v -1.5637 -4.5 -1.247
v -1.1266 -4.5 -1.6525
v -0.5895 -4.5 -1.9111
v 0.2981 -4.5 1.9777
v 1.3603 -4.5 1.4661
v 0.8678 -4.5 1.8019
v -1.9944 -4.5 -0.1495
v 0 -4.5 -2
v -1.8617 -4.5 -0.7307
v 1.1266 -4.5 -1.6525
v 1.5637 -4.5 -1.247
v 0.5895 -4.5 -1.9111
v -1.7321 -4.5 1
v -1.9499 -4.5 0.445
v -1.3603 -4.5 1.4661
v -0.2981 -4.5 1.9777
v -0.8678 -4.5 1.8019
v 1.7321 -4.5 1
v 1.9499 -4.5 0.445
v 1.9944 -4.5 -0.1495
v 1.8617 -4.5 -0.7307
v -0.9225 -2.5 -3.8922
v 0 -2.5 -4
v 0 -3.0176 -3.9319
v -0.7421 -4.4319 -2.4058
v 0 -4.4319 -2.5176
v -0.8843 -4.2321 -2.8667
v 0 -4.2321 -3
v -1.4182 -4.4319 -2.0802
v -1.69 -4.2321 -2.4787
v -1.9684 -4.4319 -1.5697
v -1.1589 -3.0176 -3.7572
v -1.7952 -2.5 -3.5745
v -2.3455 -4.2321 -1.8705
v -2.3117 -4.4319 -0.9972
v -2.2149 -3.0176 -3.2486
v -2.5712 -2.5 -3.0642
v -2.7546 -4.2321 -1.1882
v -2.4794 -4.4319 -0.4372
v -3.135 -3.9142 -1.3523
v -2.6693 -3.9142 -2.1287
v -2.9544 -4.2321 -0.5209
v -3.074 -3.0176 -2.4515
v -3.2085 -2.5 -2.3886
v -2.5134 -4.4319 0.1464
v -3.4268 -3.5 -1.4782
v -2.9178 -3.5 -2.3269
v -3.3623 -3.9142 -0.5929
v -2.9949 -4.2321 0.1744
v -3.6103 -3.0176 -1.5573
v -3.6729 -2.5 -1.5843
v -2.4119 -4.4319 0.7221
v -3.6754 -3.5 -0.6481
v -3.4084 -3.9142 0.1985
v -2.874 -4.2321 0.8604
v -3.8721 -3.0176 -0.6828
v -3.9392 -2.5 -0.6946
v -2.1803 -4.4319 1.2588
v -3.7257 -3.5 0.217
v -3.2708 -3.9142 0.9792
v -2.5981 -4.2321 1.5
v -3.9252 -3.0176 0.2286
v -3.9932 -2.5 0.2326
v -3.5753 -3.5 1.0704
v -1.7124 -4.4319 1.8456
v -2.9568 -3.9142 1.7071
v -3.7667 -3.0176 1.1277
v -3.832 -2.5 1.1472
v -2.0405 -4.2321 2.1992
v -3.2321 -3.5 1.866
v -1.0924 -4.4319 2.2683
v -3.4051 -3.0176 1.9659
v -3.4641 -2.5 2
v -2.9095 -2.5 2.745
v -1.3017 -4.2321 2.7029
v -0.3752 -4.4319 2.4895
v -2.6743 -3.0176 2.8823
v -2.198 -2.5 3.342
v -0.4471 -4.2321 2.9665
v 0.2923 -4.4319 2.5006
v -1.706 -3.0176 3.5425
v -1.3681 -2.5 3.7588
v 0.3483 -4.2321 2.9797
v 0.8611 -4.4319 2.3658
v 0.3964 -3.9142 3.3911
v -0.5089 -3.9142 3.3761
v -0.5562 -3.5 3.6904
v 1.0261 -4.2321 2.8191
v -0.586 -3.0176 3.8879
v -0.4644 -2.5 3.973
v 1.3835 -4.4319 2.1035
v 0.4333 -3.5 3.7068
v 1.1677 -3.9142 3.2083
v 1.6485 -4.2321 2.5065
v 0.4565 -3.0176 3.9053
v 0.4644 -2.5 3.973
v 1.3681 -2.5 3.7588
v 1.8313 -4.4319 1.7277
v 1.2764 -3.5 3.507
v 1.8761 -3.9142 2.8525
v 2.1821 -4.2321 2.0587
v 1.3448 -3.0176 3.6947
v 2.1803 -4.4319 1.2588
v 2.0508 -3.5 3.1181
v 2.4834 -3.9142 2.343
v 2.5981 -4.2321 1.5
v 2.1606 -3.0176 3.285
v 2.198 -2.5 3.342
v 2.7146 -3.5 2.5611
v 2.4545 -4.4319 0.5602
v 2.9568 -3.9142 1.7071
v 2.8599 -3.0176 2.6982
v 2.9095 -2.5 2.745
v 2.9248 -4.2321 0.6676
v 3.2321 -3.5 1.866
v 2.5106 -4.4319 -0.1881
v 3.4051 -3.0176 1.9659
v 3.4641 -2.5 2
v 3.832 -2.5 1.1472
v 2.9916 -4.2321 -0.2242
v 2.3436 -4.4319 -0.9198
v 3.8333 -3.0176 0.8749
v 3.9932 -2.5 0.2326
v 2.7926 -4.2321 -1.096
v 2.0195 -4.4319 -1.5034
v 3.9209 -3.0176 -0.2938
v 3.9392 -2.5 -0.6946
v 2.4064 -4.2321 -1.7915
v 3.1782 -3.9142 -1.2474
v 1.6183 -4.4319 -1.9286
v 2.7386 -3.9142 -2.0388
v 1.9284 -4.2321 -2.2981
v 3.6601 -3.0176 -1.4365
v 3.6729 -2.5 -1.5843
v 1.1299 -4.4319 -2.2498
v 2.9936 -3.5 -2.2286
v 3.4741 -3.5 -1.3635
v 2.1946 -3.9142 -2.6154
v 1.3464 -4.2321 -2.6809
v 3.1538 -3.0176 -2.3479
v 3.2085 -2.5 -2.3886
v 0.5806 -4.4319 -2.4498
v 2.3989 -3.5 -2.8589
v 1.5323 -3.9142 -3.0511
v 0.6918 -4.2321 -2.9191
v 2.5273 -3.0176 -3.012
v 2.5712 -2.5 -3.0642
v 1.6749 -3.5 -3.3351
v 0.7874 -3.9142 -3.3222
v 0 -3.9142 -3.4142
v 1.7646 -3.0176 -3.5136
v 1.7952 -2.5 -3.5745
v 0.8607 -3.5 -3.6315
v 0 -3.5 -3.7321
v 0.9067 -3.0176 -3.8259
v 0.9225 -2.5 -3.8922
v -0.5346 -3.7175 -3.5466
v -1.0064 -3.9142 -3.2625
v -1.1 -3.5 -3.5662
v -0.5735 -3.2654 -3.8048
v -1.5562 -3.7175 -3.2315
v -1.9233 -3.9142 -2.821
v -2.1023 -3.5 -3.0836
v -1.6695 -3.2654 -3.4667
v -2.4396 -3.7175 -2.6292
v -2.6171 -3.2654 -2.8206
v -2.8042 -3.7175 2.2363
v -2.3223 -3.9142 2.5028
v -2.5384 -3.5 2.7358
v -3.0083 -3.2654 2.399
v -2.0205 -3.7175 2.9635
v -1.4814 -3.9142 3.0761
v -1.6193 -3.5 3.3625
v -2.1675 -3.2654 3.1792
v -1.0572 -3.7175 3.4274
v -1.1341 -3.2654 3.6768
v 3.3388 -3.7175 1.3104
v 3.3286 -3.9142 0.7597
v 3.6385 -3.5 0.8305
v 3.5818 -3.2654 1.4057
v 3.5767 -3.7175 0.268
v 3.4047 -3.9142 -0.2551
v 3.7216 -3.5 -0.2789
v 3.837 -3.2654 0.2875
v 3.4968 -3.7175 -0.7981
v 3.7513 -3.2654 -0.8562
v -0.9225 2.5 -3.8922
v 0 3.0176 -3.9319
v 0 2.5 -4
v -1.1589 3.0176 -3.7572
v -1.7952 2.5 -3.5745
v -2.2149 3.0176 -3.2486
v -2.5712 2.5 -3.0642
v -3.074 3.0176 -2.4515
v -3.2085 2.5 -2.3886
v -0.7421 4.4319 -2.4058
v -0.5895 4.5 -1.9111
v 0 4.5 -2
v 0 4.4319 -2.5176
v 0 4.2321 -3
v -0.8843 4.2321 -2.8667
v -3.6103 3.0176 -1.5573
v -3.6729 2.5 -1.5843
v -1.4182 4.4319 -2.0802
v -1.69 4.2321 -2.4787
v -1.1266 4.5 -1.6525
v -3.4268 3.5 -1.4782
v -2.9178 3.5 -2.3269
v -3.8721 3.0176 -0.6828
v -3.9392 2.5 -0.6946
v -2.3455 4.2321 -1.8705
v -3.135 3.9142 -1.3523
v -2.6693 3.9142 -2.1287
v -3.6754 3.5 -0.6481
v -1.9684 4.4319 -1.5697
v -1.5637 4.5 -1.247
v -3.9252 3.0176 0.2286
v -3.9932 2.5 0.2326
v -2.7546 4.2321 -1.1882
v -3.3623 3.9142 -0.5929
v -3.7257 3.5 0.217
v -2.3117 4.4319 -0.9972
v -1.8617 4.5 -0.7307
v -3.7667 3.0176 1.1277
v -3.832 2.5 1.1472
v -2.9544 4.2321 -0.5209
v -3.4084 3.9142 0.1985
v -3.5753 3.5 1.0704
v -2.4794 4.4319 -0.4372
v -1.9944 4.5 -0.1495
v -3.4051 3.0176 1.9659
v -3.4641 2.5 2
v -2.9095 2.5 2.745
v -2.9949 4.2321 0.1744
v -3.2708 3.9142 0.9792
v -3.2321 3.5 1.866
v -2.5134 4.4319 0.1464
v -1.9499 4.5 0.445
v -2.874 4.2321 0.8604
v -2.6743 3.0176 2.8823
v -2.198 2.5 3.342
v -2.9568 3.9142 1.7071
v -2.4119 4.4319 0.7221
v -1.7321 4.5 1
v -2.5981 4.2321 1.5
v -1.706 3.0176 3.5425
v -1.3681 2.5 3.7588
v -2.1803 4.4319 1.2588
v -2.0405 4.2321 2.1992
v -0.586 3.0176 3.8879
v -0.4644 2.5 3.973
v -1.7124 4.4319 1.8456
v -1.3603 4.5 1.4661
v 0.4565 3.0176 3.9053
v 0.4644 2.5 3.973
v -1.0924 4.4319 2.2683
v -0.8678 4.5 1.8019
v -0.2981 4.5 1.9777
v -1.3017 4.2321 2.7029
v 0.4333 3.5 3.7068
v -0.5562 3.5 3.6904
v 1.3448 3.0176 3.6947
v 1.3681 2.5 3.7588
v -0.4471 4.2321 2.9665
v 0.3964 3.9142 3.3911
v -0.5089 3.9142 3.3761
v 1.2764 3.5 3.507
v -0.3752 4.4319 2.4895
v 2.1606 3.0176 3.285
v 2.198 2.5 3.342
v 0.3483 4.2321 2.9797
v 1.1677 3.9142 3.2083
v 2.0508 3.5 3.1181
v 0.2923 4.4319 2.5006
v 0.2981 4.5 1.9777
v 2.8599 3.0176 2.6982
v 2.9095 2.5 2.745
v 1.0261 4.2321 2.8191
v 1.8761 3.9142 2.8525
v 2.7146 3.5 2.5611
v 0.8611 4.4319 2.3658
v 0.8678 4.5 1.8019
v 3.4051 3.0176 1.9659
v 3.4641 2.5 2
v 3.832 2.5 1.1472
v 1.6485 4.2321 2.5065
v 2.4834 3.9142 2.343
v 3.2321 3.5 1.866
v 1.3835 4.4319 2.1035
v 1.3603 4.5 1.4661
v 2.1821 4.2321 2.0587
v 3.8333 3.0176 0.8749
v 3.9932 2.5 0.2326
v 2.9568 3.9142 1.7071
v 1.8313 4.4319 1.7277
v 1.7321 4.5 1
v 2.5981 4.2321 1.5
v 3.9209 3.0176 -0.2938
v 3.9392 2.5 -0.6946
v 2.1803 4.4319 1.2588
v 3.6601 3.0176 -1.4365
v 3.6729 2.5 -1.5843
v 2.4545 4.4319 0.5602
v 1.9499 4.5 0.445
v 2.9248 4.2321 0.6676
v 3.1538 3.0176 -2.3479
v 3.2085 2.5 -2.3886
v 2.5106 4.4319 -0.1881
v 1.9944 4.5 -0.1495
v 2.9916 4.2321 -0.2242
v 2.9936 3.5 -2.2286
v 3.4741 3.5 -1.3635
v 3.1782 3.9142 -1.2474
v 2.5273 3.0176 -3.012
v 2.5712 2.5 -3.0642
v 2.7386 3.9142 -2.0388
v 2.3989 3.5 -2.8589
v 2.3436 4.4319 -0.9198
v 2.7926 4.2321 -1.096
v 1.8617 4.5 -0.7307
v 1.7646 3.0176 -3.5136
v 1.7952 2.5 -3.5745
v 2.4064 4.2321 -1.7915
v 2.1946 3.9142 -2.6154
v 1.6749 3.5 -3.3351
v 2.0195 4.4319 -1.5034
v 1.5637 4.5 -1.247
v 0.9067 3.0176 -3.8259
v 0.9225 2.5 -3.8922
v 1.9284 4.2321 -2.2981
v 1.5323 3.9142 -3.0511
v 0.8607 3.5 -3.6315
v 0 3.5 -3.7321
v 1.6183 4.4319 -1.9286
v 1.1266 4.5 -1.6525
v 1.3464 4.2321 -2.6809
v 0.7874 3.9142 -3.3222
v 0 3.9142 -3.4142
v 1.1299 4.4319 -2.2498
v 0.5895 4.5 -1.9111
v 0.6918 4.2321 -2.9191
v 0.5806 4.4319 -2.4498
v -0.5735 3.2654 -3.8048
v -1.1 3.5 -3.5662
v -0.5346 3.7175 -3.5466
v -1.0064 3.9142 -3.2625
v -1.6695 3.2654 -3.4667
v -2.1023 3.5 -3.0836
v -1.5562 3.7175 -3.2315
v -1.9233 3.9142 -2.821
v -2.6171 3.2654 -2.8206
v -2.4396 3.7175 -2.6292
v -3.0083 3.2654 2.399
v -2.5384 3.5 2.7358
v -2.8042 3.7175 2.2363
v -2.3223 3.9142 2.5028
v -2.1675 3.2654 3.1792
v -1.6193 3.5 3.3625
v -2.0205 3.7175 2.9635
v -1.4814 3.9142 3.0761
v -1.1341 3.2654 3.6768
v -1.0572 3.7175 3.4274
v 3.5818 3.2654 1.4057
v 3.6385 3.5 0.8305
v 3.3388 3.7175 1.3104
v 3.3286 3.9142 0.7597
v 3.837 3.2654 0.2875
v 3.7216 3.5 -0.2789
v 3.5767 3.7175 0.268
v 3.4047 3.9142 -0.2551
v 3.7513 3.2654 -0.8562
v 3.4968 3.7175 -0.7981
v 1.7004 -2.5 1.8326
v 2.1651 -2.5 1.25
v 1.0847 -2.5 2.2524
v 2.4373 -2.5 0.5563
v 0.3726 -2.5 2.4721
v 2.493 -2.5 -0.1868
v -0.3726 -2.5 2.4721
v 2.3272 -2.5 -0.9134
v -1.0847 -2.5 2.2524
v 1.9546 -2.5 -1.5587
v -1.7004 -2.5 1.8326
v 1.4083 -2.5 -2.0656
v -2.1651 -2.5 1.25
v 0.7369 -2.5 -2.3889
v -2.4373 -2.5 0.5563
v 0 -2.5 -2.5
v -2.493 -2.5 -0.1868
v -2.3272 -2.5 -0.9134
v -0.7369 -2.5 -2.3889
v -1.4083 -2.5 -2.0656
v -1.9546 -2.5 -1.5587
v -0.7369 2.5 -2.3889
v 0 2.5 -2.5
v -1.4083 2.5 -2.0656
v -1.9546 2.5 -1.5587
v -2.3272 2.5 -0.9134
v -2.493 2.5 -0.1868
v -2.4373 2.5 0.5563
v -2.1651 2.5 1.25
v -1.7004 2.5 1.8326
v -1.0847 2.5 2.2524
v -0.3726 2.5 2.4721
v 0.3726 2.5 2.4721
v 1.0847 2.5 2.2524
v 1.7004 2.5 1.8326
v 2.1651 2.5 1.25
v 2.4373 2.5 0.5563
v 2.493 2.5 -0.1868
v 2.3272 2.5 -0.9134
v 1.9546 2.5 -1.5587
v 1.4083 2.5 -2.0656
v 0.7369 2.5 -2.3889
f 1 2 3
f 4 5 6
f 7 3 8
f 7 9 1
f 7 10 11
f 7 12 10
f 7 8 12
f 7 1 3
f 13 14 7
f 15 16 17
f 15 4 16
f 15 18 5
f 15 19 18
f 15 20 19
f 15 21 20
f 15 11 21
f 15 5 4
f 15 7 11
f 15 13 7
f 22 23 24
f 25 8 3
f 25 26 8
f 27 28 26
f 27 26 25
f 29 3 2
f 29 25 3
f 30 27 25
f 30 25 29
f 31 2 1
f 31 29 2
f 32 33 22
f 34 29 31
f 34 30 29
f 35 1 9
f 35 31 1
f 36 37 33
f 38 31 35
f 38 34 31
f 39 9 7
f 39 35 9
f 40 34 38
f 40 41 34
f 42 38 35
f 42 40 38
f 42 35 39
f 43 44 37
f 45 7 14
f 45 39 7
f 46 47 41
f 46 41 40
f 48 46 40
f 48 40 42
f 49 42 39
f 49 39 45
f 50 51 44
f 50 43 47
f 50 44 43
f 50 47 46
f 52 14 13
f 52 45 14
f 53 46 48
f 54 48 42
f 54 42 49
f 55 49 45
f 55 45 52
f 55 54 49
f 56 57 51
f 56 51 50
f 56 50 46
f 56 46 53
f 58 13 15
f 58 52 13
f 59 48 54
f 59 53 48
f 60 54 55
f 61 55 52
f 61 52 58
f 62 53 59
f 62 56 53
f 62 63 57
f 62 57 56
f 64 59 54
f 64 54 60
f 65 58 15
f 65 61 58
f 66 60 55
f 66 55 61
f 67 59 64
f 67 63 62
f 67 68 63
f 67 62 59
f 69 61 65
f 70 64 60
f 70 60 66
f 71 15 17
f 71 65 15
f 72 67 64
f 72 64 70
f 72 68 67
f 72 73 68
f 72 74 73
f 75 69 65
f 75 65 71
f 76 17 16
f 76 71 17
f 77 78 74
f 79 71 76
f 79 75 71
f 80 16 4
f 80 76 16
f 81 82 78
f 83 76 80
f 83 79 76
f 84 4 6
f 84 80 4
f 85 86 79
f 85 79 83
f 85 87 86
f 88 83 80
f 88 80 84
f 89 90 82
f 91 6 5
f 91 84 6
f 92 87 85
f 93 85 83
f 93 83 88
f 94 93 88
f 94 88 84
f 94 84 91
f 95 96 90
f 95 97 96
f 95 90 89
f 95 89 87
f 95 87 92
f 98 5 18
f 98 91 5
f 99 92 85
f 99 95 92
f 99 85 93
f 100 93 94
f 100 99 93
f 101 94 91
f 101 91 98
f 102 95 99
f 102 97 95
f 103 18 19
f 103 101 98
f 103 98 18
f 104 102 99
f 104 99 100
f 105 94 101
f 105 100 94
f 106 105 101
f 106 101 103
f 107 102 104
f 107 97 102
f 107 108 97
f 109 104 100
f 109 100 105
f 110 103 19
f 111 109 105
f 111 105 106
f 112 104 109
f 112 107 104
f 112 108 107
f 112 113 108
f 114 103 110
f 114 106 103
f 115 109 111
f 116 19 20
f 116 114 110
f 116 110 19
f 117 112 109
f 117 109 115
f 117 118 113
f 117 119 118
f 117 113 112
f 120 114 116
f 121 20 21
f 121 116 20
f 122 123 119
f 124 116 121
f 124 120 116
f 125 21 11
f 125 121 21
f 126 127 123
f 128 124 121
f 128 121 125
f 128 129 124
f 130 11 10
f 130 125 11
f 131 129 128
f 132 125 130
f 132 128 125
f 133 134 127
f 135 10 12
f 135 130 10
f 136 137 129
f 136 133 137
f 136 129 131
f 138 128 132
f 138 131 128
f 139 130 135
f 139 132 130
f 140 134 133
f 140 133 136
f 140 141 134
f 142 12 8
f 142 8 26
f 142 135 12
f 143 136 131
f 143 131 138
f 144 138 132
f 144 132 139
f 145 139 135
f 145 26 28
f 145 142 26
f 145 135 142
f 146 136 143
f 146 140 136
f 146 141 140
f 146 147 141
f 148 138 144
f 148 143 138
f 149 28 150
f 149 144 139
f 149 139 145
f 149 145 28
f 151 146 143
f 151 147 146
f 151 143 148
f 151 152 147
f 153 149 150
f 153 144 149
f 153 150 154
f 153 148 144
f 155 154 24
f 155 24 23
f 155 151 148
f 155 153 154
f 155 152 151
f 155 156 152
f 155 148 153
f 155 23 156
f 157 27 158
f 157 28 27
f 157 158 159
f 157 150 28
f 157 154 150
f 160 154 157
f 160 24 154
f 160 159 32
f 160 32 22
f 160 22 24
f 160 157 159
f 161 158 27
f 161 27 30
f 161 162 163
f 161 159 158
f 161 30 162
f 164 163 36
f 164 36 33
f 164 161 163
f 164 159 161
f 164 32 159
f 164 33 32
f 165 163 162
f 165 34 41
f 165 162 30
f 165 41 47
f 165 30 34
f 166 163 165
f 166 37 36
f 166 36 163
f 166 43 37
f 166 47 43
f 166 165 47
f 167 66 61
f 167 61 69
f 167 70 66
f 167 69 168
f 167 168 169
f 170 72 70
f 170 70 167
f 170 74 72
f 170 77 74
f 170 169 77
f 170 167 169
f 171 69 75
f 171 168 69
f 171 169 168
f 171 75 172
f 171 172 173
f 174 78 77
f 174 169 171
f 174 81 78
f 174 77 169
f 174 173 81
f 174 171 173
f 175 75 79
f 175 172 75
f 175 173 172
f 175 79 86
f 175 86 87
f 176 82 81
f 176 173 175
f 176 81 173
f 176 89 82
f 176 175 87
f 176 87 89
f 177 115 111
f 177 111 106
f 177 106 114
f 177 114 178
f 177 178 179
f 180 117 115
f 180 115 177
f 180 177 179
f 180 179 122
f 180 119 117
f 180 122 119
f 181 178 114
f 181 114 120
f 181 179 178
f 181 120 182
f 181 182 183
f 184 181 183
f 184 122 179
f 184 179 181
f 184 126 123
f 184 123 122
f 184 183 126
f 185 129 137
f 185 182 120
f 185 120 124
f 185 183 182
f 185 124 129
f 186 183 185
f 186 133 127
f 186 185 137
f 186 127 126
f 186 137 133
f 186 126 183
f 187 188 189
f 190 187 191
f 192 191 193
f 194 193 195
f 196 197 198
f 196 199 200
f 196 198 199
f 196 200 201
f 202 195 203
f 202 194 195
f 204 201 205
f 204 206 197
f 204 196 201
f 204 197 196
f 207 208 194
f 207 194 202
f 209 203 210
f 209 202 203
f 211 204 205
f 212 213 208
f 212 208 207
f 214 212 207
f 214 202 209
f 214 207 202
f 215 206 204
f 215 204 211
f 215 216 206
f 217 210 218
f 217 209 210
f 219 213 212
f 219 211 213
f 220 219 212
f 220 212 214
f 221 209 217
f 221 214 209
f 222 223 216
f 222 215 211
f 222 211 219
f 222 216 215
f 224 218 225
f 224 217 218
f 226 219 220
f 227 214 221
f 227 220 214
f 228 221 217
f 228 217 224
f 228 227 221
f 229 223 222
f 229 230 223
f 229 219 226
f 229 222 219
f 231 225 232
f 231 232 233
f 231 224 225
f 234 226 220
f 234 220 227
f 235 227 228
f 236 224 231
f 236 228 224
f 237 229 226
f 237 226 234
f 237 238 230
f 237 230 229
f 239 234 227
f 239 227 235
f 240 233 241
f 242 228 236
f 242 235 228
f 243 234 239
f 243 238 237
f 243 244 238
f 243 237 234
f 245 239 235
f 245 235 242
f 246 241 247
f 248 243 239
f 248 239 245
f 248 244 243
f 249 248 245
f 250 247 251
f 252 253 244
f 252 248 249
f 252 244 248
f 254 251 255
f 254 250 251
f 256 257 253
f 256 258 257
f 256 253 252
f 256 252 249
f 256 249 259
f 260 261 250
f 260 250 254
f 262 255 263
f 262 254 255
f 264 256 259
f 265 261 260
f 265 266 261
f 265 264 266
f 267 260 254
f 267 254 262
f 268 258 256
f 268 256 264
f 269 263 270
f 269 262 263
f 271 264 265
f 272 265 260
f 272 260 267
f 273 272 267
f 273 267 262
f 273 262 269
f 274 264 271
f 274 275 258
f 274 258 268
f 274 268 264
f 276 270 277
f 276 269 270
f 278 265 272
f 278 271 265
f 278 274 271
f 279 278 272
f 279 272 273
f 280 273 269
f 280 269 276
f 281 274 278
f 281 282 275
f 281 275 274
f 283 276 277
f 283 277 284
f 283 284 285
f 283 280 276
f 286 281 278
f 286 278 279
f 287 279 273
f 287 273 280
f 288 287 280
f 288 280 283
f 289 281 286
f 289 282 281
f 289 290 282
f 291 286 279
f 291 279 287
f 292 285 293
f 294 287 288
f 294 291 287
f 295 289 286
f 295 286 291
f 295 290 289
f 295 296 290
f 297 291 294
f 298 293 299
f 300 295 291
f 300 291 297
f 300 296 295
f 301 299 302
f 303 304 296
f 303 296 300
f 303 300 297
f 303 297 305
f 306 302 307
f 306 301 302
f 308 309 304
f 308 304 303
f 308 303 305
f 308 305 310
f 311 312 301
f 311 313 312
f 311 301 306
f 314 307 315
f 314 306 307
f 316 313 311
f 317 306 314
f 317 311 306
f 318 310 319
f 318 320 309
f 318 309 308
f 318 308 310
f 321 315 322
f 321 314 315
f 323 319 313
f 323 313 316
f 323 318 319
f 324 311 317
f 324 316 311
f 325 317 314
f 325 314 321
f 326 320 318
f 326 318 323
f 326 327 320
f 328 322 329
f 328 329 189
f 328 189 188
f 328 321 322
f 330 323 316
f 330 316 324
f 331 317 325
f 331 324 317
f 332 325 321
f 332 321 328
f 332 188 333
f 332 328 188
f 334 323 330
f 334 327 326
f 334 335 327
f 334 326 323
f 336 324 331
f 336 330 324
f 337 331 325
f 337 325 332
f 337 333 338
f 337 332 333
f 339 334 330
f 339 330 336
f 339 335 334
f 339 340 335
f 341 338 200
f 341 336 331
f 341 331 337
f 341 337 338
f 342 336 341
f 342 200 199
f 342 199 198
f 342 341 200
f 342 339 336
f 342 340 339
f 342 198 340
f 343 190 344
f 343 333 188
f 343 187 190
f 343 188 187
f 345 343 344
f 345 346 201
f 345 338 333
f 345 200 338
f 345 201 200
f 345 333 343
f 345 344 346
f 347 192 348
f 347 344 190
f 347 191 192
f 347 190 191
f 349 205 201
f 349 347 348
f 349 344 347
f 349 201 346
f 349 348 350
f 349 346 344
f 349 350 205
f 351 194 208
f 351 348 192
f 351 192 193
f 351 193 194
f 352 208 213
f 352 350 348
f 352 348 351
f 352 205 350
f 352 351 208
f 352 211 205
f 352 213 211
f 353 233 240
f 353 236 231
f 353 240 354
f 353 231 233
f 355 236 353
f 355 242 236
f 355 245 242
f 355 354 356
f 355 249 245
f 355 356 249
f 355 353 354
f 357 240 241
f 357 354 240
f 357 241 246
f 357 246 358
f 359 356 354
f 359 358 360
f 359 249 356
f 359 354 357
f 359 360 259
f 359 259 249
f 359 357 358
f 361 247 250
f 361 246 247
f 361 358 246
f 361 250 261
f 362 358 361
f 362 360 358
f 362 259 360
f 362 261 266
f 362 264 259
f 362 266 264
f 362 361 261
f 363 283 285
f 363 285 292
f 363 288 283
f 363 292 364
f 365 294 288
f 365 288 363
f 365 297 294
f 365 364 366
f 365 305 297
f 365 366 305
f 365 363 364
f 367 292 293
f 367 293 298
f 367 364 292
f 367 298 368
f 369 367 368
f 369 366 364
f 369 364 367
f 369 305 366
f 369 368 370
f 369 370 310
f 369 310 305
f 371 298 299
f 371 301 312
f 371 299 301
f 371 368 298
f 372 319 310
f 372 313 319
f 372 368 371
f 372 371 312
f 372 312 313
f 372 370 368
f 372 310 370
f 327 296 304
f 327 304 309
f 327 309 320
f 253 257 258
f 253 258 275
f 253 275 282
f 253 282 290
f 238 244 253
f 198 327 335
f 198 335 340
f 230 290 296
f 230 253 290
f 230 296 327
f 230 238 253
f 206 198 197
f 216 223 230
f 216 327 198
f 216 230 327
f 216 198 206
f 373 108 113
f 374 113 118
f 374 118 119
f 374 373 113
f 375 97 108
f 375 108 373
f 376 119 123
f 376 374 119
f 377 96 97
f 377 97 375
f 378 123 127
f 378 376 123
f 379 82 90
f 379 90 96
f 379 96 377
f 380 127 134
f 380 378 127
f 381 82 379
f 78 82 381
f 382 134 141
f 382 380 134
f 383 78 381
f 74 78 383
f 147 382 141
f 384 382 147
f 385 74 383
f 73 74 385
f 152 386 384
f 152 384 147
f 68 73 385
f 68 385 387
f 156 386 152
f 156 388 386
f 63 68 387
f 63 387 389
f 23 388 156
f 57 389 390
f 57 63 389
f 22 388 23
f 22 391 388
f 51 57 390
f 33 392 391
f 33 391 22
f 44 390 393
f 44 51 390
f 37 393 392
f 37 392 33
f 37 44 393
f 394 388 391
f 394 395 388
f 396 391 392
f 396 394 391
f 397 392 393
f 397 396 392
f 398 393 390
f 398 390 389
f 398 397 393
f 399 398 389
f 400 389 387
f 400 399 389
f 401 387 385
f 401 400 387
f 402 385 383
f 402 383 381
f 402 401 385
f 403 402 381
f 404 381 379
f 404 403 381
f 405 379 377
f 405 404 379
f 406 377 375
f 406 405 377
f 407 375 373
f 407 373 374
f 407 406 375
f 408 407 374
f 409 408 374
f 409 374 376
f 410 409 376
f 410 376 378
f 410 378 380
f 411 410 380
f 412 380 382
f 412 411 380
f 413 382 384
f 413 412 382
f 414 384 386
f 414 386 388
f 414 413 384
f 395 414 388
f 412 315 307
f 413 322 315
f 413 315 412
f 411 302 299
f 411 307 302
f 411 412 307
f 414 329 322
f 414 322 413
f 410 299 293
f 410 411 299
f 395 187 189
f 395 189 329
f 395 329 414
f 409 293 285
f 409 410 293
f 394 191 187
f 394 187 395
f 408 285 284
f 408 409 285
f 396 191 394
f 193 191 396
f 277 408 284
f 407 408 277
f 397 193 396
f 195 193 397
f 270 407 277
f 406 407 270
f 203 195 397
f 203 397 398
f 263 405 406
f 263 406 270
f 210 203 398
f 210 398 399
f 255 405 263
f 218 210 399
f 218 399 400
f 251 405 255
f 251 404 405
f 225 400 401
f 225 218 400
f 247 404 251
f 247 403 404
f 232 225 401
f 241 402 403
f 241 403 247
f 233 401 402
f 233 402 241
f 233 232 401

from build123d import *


with BuildPart() as part:
    # Sketch2 → Revolve1 (revolve)
    with BuildSketch(Plane.YZ, mode=Mode.PRIVATE) as revolve1_sk:
        with BuildLine():
            Line((-2.5, 2.5), (2.5, 2.5))
            Line((2.5, 2.5), (2.5, 4))
            ThreePointArc((2.5, 4), (3.914213562, 3.414213562), (4.5, 2))
            Line((4.5, 2), (4.5, 0))
            Line((4.5, 0), (-4.5, 0))
            Line((-4.5, 0), (-4.5, 2))
            ThreePointArc((-4.5, 2), (-3.914213562, 3.414213562), (-2.5, 4))
            Line((-2.5, 4), (-2.5, 2.5))
        make_face()
    revolve(revolve1_sk.sketch.rotate(Axis((0, -8.546595011, 0), (0, 1, 0)), 180), axis=Axis((0, -8.546595011, 0), (0, 1, 0)))


solid = part.part
